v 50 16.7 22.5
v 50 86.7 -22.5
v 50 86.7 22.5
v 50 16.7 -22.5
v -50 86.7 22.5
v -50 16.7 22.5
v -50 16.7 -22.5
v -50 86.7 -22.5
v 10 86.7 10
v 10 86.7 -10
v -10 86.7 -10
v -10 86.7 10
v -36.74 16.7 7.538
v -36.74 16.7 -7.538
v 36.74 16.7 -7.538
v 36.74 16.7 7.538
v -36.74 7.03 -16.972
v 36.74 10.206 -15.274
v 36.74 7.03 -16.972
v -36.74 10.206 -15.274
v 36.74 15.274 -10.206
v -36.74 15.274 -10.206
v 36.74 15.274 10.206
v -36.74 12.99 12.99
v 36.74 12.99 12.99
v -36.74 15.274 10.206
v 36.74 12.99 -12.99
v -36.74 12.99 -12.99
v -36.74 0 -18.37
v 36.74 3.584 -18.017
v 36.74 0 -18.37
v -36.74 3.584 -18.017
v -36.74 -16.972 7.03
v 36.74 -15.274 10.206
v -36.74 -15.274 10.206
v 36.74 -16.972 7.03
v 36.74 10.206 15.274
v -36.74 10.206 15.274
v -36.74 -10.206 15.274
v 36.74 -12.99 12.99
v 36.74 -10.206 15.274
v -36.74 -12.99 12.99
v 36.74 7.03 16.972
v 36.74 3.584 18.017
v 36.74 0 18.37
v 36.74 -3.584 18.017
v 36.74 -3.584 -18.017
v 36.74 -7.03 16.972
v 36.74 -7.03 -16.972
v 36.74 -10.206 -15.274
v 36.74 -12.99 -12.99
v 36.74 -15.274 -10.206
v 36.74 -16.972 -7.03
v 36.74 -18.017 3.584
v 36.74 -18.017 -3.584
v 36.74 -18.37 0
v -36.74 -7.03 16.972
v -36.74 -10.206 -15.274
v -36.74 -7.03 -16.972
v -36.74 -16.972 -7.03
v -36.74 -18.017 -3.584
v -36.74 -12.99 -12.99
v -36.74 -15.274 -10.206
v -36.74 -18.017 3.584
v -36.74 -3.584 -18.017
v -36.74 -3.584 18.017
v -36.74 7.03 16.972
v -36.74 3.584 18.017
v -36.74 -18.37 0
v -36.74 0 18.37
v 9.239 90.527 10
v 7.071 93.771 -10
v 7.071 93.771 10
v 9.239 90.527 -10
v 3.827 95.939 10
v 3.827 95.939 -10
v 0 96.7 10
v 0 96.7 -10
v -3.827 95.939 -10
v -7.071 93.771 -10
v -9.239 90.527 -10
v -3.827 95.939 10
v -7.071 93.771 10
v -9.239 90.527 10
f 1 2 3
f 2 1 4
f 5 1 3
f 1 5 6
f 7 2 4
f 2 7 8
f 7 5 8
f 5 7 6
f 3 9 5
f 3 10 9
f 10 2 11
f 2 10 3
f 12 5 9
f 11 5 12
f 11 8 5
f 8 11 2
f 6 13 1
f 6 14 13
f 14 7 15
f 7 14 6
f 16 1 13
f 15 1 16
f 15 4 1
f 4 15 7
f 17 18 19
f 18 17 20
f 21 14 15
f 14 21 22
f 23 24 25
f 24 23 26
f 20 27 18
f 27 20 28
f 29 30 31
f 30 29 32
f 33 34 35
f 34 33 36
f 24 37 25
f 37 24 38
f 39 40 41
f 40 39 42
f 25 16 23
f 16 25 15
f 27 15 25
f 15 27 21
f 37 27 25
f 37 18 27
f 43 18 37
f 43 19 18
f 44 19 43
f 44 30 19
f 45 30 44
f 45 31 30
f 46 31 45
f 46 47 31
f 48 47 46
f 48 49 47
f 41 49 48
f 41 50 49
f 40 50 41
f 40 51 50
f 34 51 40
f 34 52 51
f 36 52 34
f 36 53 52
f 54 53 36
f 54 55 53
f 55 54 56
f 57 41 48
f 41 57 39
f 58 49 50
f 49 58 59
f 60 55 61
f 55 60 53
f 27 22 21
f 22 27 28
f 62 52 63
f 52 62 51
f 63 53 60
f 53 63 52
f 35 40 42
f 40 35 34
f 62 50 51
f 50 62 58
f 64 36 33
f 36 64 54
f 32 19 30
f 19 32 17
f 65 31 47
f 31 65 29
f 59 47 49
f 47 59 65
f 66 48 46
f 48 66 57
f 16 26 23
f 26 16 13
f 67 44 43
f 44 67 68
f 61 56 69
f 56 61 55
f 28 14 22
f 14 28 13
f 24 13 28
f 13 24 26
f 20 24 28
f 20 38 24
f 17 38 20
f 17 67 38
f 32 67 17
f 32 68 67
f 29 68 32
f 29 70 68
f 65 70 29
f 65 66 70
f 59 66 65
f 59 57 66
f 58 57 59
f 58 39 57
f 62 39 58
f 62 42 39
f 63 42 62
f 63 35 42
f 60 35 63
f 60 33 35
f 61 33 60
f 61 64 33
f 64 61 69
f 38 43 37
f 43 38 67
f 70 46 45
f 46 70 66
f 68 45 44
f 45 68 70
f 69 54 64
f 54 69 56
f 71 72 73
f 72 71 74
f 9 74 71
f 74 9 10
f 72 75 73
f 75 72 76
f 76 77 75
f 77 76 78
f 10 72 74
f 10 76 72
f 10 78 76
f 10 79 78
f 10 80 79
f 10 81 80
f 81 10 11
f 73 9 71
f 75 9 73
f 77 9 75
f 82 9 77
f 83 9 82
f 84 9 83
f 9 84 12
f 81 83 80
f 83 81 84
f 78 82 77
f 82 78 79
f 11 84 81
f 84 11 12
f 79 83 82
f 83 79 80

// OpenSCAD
// Auto-generated by scripts/author_from_manifest.py (Phase D.3).
// Source: data/phase_d_manifest.json (sku_intent='potter-osyusu-tamper-switch').
// Do not hand-edit — regenerate from the manifest.
//
// @part potter_osyusu_tamper_switch
// @kind device
// @category trim.tamper.switch
// @display-name "Potter OSYSU OS&Y Tamper Switch"
// @mfg potter_electric_signal
// @mfg-pn OSYSU-1
// @listing UL FM
// @price-usd 92.00
// @install-minutes 15
// @crew journeyman
// @param size_in number default=2 label="Size" unit="in"
// @port pipe position=[0,0,0] direction=[-1,0,0] style=grooved size_in=2 role=run_a

size_in = 1.0;

function od_mm(nps) =
    nps ==   1  ? 33.4 :
    nps == 1.25 ? 42.2 :
    nps == 1.5  ? 48.3 :
    nps ==   2  ? 60.3 : 33.4;

od = od_mm(size_in);
box_w = 100;
box_h = 70;
box_d = 45;

union() {
    // Enclosure
    translate([0, box_h/2 + od/2, 0])
        cube([box_w, box_h, box_d], center = true);
    // Pipe saddle stub
    rotate([0, 90, 0])
        cylinder(h = od * 2.2, d = od * 1.1, center = true, $fn = 32);
    // Conduit nipple
    translate([0, box_h + od/2, 0])
        cylinder(h = 20, d = 20, center = true, $fn = 16);
}
